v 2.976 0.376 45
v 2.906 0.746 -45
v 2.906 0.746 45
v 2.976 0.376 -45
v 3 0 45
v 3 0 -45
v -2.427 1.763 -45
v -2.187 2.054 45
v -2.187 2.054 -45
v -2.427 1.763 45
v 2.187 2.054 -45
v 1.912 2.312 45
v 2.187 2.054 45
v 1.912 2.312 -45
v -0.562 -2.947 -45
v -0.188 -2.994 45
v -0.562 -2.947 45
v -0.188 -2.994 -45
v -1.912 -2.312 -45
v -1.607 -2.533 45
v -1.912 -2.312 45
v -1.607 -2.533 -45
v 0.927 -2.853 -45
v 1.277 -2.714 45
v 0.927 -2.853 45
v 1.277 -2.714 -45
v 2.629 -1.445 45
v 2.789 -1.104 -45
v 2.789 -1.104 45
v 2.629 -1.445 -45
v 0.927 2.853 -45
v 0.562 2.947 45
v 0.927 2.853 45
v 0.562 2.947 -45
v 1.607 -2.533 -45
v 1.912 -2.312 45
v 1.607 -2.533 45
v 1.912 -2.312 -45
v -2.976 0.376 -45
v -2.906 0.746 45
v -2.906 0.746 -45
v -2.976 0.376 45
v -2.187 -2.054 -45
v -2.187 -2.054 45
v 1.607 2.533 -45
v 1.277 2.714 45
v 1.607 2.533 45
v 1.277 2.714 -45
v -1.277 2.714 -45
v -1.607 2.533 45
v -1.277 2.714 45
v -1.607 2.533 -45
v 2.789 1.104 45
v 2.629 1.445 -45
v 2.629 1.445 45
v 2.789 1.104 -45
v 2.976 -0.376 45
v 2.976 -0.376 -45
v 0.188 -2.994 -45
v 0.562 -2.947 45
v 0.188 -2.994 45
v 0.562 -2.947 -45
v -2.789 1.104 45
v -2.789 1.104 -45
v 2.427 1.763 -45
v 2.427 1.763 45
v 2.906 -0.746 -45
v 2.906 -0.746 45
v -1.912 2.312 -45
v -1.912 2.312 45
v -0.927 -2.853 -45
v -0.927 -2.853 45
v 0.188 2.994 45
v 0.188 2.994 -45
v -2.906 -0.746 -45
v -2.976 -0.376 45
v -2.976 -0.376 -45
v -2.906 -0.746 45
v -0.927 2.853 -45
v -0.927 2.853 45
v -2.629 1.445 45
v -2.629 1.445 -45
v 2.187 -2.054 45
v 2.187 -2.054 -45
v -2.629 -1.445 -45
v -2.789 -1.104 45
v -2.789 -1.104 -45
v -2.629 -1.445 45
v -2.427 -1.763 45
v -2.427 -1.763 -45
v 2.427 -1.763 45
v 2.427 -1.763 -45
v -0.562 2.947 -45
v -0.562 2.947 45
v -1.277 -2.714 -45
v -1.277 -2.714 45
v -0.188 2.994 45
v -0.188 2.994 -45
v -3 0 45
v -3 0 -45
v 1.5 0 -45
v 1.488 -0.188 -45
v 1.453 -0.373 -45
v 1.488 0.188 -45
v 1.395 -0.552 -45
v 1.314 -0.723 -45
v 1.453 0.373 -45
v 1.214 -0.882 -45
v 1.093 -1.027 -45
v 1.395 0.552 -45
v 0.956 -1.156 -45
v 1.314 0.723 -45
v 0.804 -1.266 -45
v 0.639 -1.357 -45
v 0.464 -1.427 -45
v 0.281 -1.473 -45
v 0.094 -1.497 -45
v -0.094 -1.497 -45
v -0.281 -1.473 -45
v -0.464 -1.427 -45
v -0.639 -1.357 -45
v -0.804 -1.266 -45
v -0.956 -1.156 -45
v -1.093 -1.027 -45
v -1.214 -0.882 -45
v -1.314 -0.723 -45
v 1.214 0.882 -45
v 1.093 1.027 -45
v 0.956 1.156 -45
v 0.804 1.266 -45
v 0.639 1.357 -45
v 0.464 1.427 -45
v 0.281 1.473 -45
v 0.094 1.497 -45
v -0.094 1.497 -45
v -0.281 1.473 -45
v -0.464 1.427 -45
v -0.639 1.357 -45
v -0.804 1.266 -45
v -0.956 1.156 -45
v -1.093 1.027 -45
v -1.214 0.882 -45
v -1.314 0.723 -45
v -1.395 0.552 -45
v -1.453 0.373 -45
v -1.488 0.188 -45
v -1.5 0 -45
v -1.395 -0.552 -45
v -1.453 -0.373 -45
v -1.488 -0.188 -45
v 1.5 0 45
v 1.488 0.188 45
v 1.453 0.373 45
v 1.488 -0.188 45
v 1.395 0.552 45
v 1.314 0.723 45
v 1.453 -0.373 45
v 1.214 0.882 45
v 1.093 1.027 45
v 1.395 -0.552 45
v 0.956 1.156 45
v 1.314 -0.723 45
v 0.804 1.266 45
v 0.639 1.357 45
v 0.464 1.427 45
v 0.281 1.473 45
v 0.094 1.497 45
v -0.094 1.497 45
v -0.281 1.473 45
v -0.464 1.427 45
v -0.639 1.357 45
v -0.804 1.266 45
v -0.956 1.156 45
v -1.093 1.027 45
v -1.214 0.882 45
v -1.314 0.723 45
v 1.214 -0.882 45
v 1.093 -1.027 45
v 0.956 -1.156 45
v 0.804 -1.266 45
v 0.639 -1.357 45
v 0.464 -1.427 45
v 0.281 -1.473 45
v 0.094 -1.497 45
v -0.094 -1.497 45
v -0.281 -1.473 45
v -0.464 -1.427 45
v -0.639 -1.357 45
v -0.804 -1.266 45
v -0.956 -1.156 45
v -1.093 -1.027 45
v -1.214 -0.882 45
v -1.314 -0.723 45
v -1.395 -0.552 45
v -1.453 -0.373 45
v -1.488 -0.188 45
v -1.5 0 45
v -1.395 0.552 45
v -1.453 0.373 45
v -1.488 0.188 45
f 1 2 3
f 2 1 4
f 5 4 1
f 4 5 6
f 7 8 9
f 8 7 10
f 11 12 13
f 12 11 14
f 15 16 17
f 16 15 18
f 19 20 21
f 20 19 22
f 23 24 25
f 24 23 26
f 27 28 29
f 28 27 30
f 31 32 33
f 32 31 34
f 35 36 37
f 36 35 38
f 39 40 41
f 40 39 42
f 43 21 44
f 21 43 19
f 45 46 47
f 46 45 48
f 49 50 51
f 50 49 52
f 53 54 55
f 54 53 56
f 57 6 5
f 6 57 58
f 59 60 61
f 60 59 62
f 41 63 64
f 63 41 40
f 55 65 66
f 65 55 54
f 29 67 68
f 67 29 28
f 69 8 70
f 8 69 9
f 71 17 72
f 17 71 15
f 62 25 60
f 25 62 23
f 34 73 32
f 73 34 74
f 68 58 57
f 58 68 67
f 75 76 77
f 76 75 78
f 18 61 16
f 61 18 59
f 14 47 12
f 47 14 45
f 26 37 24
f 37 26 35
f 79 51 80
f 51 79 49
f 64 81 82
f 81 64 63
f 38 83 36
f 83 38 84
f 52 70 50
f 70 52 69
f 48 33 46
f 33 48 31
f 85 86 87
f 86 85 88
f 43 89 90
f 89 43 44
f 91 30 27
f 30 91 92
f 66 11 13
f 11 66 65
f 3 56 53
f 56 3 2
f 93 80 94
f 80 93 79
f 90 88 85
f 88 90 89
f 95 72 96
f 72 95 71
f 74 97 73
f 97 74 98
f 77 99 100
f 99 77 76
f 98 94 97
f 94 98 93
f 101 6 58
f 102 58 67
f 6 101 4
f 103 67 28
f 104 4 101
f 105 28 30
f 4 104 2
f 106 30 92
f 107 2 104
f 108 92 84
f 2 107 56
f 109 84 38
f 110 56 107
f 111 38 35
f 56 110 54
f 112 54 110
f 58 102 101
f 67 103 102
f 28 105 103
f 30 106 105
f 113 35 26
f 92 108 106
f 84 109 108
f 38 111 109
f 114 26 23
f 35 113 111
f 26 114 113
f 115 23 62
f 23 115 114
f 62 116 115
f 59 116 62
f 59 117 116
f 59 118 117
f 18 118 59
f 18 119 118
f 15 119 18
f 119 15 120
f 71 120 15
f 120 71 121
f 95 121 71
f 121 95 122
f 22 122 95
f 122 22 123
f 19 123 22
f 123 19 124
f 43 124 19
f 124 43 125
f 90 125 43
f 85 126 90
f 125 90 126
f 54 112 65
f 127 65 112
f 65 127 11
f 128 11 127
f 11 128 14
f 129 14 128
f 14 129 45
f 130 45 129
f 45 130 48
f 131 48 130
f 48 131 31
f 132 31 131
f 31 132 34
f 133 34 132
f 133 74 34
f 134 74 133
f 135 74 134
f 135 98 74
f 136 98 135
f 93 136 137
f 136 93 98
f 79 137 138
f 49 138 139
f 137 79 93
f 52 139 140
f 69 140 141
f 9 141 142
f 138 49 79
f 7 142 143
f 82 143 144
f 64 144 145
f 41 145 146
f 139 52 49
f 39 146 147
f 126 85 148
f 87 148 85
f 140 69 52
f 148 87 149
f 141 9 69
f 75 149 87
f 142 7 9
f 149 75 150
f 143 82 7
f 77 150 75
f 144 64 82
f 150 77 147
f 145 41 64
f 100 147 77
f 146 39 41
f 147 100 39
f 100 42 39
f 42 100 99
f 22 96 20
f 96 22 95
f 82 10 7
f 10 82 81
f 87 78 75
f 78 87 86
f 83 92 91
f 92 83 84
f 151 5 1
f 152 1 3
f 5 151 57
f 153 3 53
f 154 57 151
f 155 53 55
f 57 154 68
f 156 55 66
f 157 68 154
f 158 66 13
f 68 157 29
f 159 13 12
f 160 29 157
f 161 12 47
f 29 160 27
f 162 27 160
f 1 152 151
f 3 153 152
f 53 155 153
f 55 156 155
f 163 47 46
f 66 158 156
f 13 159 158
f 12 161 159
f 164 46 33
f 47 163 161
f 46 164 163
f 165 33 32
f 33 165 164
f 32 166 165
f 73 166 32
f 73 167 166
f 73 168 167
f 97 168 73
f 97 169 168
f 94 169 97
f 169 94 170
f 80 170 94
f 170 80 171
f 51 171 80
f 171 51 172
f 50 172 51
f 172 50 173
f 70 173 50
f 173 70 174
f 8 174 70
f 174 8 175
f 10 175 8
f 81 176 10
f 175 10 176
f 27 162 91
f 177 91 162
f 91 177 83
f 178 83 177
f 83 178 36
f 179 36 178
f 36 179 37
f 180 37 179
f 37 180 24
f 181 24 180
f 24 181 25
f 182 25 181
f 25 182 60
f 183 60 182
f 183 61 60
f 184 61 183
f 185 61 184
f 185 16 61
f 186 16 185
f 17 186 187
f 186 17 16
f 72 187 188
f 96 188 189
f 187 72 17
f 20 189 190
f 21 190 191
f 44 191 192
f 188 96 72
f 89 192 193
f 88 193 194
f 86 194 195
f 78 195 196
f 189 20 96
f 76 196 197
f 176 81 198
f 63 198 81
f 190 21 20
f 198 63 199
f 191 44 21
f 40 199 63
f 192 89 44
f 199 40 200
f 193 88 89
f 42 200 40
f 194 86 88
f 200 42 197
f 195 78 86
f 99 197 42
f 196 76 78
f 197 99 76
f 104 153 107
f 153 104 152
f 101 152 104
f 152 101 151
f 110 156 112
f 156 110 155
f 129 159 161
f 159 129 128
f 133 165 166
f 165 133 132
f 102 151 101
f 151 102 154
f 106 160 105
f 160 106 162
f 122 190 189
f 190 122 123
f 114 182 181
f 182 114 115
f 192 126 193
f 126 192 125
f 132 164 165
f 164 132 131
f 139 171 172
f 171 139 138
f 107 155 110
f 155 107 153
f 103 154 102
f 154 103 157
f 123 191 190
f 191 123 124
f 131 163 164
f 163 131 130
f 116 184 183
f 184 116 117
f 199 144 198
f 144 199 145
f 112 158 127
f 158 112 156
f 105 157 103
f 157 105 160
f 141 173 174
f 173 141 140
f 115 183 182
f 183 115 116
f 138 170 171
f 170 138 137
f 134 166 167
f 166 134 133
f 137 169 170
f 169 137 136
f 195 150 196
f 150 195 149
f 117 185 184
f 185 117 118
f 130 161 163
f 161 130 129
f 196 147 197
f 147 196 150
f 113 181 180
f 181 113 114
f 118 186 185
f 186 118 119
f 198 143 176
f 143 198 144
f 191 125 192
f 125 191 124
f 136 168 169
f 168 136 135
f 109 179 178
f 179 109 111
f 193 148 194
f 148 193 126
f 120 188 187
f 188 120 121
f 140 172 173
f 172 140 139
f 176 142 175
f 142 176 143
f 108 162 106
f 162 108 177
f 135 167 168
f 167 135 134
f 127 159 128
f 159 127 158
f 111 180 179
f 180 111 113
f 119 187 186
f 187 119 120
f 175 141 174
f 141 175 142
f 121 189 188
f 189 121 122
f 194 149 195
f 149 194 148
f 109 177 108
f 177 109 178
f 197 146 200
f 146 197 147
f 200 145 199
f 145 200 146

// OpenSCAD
$fn = 50;


difference() {
	union() {
		translate(v = [0, 0, -45.0000000000]) {
			cylinder(h = 90, r = 3.0000000000);
		}
	}
	union() {
		translate(v = [0, 0, -100.0000000000]) {
			cylinder(h = 200, r = 1.5000000000);
		}
	}
}
